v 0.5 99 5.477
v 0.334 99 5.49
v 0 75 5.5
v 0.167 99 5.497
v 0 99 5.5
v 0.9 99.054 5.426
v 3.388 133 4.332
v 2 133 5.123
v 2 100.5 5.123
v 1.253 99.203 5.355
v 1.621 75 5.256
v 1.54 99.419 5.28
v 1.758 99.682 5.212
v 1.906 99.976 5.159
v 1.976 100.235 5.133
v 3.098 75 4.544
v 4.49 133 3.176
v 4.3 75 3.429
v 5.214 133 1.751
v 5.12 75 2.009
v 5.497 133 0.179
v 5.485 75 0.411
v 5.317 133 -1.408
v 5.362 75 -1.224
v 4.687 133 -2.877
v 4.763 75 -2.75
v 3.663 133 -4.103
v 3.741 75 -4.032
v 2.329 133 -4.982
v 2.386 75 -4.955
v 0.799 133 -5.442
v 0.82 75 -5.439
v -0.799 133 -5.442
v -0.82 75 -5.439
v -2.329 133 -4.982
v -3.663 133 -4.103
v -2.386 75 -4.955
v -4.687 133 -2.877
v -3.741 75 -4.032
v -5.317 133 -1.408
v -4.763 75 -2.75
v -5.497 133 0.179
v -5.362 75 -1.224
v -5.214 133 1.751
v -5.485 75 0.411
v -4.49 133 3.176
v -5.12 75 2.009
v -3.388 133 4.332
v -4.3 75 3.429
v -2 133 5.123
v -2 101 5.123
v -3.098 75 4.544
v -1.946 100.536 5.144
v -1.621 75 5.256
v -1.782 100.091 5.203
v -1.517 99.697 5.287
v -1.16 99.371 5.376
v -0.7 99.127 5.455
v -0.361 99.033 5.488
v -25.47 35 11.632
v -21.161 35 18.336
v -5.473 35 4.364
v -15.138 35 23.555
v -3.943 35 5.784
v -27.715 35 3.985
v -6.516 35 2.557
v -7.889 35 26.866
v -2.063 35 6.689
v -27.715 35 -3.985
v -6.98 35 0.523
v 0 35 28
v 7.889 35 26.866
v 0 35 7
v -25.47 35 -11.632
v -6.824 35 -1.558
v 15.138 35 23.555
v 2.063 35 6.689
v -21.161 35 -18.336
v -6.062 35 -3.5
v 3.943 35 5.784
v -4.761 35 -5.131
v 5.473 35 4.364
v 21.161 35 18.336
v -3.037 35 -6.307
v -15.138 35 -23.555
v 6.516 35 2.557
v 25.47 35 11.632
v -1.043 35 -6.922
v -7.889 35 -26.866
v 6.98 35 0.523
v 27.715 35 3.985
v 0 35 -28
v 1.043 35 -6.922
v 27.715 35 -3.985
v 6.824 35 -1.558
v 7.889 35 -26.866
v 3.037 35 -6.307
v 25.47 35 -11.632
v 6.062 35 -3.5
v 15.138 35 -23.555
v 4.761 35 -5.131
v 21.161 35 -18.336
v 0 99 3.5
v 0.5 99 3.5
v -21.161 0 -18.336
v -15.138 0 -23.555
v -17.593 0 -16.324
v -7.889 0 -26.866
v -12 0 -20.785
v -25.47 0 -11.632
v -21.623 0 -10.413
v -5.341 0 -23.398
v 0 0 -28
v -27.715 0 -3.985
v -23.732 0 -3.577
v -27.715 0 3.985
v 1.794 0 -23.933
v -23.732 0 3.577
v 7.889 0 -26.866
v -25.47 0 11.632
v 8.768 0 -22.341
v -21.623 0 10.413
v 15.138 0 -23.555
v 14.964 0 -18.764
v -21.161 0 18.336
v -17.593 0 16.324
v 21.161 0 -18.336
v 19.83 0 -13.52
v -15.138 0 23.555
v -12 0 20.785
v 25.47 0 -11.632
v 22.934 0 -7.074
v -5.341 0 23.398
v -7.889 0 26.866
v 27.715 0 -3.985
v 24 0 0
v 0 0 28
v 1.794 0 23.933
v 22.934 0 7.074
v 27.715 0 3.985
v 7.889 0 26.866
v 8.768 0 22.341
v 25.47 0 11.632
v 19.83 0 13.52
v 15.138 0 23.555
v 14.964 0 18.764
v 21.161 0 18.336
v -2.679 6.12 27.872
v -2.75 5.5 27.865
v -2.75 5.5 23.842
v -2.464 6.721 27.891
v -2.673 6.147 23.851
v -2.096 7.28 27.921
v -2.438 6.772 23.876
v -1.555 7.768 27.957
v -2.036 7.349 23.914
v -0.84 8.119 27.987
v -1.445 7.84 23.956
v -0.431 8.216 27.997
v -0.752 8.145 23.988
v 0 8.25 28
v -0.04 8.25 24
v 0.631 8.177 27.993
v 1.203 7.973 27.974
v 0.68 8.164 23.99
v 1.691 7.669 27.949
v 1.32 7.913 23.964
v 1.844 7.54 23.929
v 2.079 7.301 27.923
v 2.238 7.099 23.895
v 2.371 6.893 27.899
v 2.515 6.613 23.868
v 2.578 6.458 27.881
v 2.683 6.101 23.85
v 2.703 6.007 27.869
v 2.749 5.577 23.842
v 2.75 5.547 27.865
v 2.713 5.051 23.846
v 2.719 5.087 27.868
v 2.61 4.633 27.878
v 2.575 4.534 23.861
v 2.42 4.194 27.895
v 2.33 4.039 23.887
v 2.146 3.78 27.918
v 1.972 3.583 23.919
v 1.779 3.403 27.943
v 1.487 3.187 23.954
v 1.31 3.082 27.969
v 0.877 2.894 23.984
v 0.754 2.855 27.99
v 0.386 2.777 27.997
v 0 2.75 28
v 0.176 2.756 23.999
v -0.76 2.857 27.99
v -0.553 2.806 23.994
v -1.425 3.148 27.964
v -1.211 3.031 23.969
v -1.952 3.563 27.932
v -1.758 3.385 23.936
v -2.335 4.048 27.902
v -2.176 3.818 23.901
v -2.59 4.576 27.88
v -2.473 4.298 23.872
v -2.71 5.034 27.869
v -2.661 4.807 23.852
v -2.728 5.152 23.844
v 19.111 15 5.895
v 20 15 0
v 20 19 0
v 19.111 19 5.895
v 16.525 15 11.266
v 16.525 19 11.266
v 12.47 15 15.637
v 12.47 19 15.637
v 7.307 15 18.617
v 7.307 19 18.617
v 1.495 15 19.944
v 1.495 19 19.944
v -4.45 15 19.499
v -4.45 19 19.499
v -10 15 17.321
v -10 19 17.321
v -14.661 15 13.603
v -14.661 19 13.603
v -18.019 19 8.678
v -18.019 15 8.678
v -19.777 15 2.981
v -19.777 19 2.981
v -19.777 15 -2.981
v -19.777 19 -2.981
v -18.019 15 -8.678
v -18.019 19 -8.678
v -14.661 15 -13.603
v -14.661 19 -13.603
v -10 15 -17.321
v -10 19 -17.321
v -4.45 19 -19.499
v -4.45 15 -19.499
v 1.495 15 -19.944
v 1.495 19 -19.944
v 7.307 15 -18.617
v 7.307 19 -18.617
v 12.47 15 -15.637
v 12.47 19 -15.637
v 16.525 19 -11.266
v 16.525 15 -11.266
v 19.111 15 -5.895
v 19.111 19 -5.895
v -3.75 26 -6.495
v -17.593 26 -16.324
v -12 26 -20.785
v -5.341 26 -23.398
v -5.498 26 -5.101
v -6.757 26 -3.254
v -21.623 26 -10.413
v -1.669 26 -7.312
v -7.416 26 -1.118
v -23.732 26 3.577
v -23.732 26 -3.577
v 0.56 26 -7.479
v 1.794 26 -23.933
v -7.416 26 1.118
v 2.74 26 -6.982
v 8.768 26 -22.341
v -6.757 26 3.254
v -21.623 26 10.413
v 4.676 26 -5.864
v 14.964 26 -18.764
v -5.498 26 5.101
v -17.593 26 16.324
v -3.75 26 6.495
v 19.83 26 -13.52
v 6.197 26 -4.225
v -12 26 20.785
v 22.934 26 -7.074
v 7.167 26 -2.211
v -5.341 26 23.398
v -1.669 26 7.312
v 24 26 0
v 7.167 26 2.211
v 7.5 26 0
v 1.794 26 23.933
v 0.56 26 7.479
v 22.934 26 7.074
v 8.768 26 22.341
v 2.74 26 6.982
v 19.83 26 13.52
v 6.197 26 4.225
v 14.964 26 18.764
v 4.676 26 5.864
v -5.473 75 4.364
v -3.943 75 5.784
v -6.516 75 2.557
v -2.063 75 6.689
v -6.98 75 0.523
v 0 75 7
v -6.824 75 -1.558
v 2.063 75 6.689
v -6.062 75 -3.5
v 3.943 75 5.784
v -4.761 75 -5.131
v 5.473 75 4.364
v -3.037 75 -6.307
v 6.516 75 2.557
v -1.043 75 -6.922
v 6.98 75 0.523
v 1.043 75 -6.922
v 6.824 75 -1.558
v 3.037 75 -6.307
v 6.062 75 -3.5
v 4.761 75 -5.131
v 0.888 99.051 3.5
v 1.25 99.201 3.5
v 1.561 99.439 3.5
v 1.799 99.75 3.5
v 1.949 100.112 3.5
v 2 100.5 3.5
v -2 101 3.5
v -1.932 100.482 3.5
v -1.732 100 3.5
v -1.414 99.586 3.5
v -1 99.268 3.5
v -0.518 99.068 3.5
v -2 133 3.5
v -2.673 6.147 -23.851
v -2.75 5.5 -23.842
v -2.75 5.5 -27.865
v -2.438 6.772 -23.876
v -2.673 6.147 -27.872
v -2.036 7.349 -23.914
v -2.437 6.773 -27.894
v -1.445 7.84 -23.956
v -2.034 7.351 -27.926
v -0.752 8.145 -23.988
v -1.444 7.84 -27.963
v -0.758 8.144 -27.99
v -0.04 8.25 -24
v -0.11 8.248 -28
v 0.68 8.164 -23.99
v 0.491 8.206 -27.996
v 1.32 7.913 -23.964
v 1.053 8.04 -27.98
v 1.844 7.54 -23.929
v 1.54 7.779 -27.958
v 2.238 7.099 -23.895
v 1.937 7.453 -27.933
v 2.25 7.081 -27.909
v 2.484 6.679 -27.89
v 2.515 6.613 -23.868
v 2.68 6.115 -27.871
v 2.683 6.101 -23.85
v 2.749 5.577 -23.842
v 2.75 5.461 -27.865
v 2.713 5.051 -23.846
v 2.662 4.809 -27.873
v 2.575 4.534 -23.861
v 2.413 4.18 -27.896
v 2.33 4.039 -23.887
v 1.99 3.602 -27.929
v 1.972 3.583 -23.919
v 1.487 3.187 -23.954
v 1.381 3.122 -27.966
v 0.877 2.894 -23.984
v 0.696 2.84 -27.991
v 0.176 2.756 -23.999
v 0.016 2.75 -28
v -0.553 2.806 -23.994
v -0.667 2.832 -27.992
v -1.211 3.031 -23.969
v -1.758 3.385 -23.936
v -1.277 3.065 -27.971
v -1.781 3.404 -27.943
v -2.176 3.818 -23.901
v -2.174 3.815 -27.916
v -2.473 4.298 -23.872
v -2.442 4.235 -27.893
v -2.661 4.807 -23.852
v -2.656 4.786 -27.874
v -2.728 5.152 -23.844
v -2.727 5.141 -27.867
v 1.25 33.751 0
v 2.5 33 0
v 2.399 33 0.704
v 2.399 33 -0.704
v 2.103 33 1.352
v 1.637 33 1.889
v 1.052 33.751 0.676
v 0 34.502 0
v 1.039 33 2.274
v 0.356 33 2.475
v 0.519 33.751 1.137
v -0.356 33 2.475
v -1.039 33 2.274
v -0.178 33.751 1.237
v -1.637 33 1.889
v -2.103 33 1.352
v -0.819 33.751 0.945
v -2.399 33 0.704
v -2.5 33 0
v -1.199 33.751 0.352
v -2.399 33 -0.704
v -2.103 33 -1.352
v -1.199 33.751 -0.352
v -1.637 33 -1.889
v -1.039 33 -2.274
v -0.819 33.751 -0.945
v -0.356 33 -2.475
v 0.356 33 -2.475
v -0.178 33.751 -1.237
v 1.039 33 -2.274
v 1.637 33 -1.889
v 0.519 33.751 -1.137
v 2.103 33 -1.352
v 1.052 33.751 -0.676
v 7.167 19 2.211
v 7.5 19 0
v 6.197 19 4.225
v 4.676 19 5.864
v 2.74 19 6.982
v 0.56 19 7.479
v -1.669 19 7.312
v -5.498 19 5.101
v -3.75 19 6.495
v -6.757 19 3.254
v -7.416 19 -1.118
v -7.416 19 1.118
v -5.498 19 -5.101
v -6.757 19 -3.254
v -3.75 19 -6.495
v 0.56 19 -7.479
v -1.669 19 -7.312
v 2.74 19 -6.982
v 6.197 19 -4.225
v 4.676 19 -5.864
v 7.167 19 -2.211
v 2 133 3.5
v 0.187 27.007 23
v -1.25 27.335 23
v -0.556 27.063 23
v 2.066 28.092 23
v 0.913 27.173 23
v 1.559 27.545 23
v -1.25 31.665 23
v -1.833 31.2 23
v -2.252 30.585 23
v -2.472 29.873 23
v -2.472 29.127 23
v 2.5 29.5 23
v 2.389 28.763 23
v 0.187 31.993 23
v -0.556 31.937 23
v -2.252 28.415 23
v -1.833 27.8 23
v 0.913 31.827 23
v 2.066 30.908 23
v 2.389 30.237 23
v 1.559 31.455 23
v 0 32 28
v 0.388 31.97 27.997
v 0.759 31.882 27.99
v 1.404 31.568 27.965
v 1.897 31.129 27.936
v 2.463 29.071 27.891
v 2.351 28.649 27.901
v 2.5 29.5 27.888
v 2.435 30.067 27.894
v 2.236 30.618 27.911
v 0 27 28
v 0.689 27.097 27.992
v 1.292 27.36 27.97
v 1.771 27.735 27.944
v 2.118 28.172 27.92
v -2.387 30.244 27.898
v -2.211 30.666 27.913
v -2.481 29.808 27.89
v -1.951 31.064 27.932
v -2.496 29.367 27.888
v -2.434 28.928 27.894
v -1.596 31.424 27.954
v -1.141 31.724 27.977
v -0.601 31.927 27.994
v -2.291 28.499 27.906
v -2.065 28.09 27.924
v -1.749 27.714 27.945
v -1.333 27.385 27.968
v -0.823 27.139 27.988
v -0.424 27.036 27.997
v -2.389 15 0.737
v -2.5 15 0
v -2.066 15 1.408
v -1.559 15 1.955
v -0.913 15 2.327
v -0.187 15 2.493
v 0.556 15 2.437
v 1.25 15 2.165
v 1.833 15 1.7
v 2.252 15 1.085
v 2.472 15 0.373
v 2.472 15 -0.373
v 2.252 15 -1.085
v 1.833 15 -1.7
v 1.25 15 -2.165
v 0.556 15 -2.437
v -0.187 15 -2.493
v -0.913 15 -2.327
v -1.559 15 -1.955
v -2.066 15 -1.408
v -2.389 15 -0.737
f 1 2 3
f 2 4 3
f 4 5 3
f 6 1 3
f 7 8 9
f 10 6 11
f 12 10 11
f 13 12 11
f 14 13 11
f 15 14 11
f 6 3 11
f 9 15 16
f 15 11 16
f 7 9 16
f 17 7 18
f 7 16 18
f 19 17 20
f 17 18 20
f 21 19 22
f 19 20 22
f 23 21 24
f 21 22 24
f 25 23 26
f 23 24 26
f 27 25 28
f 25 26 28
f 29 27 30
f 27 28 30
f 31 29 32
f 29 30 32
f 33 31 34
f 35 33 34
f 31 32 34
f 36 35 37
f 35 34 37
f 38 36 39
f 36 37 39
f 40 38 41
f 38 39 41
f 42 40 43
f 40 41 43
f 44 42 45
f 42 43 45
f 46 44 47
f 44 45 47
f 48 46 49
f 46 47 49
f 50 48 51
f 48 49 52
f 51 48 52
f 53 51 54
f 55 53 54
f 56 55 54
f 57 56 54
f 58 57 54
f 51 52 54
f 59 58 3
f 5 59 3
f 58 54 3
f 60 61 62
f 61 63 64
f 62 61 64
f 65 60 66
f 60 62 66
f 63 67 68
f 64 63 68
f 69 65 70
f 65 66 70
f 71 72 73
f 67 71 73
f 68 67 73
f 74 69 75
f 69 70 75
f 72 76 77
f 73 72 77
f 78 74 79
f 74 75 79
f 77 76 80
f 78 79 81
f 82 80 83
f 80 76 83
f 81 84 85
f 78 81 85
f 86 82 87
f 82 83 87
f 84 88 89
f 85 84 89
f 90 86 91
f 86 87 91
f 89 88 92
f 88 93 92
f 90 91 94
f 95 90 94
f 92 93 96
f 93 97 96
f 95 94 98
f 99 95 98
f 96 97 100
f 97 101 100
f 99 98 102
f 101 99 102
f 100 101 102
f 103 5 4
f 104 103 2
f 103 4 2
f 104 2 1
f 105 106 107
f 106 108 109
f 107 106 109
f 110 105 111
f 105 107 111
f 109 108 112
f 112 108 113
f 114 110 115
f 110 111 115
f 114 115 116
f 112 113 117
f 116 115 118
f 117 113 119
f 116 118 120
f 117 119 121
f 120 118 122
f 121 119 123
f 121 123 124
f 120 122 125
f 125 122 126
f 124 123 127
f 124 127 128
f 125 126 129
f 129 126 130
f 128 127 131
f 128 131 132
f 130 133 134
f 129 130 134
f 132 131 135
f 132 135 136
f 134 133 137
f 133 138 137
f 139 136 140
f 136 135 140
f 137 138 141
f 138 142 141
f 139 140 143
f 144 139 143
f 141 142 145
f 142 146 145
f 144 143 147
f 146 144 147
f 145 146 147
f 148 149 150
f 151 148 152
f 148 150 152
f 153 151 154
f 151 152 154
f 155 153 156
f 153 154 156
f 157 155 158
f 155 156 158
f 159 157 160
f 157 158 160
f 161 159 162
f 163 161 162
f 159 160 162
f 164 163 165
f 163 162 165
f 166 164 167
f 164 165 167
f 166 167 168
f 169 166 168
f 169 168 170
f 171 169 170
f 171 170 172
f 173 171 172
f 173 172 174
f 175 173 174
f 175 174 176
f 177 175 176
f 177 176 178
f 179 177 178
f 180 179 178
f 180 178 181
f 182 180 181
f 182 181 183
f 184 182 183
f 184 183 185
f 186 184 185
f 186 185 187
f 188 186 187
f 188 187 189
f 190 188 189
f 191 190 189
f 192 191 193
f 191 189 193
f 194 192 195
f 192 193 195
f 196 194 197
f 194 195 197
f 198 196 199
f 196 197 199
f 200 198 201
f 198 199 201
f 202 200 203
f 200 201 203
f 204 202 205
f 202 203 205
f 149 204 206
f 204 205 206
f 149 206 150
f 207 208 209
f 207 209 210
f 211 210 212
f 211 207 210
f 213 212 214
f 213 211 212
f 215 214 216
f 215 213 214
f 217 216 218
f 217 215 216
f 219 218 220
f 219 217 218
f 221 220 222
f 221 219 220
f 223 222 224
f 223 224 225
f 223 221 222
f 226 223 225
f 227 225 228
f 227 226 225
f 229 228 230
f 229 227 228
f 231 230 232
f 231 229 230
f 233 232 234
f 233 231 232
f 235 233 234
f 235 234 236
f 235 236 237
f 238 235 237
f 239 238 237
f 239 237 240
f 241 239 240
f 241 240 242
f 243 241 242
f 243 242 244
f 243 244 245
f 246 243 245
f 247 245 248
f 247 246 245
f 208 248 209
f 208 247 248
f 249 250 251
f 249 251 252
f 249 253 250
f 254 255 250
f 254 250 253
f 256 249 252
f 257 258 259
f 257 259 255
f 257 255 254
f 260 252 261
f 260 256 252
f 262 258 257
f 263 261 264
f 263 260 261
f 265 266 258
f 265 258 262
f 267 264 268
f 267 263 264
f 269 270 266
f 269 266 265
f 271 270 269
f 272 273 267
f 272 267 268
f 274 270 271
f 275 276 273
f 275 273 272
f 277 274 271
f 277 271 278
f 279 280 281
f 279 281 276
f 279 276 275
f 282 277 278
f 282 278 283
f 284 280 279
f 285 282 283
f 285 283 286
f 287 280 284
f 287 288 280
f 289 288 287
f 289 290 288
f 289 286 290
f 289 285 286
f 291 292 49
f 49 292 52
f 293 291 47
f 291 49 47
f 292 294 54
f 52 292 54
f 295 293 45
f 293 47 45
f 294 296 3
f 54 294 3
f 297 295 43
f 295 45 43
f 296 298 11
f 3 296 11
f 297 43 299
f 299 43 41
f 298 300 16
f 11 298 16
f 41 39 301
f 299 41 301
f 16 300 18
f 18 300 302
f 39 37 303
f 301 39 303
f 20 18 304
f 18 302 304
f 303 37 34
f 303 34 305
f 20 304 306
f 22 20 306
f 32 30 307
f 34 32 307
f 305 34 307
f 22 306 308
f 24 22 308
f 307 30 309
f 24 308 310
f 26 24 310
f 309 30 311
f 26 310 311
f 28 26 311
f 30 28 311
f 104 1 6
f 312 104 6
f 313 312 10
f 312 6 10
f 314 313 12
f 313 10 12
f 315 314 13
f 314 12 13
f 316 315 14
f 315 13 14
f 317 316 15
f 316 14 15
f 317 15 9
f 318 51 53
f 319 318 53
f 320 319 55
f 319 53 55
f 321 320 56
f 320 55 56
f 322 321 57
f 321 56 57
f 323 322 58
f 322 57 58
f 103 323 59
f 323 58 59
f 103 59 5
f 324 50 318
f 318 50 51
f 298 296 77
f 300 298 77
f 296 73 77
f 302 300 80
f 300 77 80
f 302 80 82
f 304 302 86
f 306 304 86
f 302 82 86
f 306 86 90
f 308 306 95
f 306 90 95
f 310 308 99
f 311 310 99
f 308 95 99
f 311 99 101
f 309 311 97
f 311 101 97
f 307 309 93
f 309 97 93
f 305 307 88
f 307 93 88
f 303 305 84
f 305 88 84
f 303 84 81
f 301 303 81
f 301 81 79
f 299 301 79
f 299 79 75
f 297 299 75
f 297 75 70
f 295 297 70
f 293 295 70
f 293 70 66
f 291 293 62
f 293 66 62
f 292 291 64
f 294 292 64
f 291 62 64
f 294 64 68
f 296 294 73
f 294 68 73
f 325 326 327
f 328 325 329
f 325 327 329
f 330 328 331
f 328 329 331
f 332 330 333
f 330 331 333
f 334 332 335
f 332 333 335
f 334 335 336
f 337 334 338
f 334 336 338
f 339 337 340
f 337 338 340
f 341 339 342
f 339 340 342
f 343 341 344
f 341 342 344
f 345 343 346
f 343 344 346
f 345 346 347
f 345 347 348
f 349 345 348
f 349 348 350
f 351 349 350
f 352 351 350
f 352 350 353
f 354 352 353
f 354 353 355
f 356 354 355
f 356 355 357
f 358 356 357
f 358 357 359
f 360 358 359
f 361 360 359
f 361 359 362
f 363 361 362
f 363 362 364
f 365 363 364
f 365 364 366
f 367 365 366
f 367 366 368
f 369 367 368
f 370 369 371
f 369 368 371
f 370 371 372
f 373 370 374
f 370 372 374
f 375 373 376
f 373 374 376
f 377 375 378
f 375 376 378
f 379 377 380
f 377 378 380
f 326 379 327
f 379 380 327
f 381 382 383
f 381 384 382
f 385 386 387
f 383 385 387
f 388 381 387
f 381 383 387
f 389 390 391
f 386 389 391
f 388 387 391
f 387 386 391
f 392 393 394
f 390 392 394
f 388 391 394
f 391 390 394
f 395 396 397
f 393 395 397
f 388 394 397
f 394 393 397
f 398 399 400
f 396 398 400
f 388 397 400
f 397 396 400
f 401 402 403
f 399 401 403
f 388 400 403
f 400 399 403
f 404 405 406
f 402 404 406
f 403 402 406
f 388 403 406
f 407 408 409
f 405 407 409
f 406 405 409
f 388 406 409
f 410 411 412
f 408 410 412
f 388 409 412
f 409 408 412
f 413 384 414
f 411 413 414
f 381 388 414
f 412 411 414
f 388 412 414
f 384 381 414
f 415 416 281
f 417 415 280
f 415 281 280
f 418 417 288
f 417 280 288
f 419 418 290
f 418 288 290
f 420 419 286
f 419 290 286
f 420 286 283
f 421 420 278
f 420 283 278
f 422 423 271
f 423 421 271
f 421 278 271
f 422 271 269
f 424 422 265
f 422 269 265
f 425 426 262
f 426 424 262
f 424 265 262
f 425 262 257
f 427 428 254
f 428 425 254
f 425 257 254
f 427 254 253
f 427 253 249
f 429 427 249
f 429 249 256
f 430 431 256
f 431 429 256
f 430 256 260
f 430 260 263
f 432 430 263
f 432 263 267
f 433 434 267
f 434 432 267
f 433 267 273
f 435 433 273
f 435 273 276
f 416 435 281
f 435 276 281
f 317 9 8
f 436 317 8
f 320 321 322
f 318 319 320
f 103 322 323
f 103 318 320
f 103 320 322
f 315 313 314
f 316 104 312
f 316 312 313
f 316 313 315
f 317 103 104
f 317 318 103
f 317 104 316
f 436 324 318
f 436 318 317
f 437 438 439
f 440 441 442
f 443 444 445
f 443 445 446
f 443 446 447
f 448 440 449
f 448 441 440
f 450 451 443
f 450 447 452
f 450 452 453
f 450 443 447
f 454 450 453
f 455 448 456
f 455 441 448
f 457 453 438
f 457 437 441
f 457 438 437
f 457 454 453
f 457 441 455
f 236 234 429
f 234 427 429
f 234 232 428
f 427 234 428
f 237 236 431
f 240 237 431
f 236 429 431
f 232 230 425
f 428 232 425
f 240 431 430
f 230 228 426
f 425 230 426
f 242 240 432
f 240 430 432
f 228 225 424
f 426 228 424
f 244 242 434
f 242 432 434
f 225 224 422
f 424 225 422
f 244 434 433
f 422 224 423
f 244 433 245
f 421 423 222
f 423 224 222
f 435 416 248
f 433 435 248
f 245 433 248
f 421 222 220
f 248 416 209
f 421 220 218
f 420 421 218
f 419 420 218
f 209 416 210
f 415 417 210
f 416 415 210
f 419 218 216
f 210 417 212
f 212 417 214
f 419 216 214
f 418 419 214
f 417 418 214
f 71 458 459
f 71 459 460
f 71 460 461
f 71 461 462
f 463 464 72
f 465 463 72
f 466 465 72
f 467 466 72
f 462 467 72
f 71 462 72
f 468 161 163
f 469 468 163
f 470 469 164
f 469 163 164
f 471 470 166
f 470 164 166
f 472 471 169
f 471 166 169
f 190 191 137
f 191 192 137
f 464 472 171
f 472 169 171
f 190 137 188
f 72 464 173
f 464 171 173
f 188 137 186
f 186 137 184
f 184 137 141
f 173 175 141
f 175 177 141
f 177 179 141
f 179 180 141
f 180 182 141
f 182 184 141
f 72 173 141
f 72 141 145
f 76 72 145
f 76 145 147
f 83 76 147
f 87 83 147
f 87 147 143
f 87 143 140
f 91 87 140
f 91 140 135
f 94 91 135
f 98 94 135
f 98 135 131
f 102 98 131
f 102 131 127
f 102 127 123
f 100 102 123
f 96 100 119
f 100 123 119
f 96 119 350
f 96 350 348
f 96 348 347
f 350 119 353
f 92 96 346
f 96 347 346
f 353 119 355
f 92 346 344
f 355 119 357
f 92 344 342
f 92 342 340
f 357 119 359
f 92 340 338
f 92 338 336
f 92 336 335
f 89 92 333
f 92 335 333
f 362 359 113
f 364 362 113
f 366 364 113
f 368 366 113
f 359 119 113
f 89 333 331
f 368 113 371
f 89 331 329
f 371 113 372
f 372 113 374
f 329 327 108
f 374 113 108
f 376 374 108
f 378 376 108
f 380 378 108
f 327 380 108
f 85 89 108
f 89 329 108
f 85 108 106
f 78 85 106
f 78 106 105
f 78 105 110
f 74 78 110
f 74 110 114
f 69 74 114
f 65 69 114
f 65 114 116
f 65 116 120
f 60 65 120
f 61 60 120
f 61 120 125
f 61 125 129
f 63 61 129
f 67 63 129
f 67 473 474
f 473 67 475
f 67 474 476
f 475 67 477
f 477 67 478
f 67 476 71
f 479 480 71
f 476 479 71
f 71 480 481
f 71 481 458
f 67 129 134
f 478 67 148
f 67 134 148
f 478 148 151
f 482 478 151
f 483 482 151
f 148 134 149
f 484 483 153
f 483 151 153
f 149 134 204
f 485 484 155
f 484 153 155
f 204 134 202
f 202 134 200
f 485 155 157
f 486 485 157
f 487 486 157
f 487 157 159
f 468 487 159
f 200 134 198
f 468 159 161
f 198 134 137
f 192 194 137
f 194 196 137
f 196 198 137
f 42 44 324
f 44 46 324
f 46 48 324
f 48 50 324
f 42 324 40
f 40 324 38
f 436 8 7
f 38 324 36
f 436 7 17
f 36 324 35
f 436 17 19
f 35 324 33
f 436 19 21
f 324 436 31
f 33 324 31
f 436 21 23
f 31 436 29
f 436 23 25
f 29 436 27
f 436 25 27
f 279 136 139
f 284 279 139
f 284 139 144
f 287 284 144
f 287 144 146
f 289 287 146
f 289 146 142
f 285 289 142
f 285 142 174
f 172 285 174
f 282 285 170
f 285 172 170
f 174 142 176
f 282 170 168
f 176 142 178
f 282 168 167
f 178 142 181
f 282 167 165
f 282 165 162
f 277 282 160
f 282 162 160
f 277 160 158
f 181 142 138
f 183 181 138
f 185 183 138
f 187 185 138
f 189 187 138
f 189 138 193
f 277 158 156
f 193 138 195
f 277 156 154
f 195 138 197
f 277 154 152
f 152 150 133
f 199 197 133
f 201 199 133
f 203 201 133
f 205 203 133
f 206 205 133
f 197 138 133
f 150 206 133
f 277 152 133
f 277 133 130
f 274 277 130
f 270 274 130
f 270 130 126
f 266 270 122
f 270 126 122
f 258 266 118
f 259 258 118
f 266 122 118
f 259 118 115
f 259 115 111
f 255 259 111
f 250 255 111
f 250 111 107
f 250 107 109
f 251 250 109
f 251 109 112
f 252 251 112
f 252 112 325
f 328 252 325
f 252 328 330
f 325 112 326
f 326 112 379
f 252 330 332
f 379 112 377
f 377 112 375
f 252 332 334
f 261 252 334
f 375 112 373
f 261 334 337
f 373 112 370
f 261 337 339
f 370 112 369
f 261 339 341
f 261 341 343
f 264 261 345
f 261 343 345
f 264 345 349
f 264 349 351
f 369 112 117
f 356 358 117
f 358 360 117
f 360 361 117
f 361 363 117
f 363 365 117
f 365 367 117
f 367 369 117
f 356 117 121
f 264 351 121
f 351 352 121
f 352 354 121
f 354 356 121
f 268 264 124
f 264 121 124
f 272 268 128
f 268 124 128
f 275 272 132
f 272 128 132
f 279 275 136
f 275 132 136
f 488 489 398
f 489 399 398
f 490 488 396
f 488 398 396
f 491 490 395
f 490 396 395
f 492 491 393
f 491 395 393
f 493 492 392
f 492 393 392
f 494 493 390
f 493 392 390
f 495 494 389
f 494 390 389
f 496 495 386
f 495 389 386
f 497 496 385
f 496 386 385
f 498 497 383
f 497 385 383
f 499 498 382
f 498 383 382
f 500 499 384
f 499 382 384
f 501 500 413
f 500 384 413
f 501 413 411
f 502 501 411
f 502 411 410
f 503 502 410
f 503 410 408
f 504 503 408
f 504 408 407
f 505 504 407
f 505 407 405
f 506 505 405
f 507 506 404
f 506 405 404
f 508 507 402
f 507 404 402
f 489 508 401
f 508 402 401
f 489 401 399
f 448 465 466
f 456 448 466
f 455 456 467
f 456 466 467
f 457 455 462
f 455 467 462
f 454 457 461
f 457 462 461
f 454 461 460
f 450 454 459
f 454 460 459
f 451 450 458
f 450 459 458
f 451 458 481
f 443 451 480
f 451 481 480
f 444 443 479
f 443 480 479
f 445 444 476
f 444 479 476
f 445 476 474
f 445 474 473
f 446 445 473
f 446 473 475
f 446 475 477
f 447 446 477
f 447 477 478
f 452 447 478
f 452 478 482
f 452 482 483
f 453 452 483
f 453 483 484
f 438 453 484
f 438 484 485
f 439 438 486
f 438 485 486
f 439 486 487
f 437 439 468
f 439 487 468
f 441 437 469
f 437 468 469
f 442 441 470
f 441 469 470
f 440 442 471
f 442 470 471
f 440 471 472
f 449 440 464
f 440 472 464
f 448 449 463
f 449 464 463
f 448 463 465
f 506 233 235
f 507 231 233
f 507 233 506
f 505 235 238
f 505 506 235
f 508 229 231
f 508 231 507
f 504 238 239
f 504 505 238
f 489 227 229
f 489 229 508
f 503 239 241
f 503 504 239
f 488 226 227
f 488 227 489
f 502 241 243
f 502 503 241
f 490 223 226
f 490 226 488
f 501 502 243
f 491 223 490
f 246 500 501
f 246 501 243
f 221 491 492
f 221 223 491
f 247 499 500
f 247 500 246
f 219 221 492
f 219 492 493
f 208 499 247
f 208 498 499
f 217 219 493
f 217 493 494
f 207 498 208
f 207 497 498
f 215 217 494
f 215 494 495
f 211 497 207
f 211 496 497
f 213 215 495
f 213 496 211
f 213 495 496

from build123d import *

# Parameters (mm, degrees)
F4_DEPTH  = 2
F5_R      = 24
F6_DEPTH  = 26
F7_R      = 7.5
F8_DEPTH  = 11
F9_R      = 20
F10_DEPTH = 4
F13_D     = 5.5
F14_R     = 2.5
F15_DEPTH = 5
F17_D     = 5
F17_DEPTH = 18
F17_TIP   = 1.5021515476


with BuildPart() as f1:
    # F0 (on Right) → F1 (revolve)
    with BuildSketch(Plane.YZ):
        Polygon((0, 28), (0, 0), (133, 0), (133, 5.5), (75, 5.5), (75, 7), (35, 7), (35, 28), align=None)
    revolve(axis=Axis((0, 66.5, 0), (0, 1, 0)))

    # F3 (on offset) → F4 (cut)
    with BuildSketch(Plane.XY.offset(5.5)):
        with BuildLine():
            Line((0, 99), (0.5, 99))
            ThreePointArc((0.5, 99), (1.5606601718, 99.4393398282), (2, 100.5))
            Line((2, 100.5), (2, 133))
            Line((2, 133), (-2, 133))
            Line((-2, 133), (-2, 101))
            ThreePointArc((-2, 101), (-1.4142135624, 99.5857864376), (0, 99))
        make_face()
    extrude(amount=-F4_DEPTH, mode=Mode.SUBTRACT)

    # F5 (on face) → F6 (cut)
    with BuildSketch(Plane.XZ):
        Circle(F5_R)
    extrude(amount=-F6_DEPTH, mode=Mode.SUBTRACT)

    # F7 (on face) → F8 (join)
    with BuildSketch(Plane.XZ.offset(-26)):
        Circle(F7_R)
    extrude(amount=F8_DEPTH)

    # F9 (on face) → F10 (join)
    with BuildSketch(Plane.XZ.offset(-15)):
        Circle(F9_R)
    extrude(amount=-F10_DEPTH)

    # F13 (through all)
    with Locations(Plane.XY.offset(28)):
        with Locations((0, 5.5)):
            Hole(F13_D / 2)

    # F14 (on offset) → F15 (cut)
    with BuildSketch(Plane.XY.offset(28)):
        with Locations((0, 29.5)):
            Circle(F14_R)
    extrude(amount=-F15_DEPTH, mode=Mode.SUBTRACT)

    # F17
    with Locations(Plane.XZ.offset(-15)):
        with Locations((0, 0)):
            Hole(F17_D / 2, depth=F17_DEPTH)
            with Locations((0, 0, -(F17_DEPTH + F17_TIP / 2))):  # 118° drill point
                Cone(0, F17_D / 2, F17_TIP, mode=Mode.SUBTRACT)


solid = f1.part
